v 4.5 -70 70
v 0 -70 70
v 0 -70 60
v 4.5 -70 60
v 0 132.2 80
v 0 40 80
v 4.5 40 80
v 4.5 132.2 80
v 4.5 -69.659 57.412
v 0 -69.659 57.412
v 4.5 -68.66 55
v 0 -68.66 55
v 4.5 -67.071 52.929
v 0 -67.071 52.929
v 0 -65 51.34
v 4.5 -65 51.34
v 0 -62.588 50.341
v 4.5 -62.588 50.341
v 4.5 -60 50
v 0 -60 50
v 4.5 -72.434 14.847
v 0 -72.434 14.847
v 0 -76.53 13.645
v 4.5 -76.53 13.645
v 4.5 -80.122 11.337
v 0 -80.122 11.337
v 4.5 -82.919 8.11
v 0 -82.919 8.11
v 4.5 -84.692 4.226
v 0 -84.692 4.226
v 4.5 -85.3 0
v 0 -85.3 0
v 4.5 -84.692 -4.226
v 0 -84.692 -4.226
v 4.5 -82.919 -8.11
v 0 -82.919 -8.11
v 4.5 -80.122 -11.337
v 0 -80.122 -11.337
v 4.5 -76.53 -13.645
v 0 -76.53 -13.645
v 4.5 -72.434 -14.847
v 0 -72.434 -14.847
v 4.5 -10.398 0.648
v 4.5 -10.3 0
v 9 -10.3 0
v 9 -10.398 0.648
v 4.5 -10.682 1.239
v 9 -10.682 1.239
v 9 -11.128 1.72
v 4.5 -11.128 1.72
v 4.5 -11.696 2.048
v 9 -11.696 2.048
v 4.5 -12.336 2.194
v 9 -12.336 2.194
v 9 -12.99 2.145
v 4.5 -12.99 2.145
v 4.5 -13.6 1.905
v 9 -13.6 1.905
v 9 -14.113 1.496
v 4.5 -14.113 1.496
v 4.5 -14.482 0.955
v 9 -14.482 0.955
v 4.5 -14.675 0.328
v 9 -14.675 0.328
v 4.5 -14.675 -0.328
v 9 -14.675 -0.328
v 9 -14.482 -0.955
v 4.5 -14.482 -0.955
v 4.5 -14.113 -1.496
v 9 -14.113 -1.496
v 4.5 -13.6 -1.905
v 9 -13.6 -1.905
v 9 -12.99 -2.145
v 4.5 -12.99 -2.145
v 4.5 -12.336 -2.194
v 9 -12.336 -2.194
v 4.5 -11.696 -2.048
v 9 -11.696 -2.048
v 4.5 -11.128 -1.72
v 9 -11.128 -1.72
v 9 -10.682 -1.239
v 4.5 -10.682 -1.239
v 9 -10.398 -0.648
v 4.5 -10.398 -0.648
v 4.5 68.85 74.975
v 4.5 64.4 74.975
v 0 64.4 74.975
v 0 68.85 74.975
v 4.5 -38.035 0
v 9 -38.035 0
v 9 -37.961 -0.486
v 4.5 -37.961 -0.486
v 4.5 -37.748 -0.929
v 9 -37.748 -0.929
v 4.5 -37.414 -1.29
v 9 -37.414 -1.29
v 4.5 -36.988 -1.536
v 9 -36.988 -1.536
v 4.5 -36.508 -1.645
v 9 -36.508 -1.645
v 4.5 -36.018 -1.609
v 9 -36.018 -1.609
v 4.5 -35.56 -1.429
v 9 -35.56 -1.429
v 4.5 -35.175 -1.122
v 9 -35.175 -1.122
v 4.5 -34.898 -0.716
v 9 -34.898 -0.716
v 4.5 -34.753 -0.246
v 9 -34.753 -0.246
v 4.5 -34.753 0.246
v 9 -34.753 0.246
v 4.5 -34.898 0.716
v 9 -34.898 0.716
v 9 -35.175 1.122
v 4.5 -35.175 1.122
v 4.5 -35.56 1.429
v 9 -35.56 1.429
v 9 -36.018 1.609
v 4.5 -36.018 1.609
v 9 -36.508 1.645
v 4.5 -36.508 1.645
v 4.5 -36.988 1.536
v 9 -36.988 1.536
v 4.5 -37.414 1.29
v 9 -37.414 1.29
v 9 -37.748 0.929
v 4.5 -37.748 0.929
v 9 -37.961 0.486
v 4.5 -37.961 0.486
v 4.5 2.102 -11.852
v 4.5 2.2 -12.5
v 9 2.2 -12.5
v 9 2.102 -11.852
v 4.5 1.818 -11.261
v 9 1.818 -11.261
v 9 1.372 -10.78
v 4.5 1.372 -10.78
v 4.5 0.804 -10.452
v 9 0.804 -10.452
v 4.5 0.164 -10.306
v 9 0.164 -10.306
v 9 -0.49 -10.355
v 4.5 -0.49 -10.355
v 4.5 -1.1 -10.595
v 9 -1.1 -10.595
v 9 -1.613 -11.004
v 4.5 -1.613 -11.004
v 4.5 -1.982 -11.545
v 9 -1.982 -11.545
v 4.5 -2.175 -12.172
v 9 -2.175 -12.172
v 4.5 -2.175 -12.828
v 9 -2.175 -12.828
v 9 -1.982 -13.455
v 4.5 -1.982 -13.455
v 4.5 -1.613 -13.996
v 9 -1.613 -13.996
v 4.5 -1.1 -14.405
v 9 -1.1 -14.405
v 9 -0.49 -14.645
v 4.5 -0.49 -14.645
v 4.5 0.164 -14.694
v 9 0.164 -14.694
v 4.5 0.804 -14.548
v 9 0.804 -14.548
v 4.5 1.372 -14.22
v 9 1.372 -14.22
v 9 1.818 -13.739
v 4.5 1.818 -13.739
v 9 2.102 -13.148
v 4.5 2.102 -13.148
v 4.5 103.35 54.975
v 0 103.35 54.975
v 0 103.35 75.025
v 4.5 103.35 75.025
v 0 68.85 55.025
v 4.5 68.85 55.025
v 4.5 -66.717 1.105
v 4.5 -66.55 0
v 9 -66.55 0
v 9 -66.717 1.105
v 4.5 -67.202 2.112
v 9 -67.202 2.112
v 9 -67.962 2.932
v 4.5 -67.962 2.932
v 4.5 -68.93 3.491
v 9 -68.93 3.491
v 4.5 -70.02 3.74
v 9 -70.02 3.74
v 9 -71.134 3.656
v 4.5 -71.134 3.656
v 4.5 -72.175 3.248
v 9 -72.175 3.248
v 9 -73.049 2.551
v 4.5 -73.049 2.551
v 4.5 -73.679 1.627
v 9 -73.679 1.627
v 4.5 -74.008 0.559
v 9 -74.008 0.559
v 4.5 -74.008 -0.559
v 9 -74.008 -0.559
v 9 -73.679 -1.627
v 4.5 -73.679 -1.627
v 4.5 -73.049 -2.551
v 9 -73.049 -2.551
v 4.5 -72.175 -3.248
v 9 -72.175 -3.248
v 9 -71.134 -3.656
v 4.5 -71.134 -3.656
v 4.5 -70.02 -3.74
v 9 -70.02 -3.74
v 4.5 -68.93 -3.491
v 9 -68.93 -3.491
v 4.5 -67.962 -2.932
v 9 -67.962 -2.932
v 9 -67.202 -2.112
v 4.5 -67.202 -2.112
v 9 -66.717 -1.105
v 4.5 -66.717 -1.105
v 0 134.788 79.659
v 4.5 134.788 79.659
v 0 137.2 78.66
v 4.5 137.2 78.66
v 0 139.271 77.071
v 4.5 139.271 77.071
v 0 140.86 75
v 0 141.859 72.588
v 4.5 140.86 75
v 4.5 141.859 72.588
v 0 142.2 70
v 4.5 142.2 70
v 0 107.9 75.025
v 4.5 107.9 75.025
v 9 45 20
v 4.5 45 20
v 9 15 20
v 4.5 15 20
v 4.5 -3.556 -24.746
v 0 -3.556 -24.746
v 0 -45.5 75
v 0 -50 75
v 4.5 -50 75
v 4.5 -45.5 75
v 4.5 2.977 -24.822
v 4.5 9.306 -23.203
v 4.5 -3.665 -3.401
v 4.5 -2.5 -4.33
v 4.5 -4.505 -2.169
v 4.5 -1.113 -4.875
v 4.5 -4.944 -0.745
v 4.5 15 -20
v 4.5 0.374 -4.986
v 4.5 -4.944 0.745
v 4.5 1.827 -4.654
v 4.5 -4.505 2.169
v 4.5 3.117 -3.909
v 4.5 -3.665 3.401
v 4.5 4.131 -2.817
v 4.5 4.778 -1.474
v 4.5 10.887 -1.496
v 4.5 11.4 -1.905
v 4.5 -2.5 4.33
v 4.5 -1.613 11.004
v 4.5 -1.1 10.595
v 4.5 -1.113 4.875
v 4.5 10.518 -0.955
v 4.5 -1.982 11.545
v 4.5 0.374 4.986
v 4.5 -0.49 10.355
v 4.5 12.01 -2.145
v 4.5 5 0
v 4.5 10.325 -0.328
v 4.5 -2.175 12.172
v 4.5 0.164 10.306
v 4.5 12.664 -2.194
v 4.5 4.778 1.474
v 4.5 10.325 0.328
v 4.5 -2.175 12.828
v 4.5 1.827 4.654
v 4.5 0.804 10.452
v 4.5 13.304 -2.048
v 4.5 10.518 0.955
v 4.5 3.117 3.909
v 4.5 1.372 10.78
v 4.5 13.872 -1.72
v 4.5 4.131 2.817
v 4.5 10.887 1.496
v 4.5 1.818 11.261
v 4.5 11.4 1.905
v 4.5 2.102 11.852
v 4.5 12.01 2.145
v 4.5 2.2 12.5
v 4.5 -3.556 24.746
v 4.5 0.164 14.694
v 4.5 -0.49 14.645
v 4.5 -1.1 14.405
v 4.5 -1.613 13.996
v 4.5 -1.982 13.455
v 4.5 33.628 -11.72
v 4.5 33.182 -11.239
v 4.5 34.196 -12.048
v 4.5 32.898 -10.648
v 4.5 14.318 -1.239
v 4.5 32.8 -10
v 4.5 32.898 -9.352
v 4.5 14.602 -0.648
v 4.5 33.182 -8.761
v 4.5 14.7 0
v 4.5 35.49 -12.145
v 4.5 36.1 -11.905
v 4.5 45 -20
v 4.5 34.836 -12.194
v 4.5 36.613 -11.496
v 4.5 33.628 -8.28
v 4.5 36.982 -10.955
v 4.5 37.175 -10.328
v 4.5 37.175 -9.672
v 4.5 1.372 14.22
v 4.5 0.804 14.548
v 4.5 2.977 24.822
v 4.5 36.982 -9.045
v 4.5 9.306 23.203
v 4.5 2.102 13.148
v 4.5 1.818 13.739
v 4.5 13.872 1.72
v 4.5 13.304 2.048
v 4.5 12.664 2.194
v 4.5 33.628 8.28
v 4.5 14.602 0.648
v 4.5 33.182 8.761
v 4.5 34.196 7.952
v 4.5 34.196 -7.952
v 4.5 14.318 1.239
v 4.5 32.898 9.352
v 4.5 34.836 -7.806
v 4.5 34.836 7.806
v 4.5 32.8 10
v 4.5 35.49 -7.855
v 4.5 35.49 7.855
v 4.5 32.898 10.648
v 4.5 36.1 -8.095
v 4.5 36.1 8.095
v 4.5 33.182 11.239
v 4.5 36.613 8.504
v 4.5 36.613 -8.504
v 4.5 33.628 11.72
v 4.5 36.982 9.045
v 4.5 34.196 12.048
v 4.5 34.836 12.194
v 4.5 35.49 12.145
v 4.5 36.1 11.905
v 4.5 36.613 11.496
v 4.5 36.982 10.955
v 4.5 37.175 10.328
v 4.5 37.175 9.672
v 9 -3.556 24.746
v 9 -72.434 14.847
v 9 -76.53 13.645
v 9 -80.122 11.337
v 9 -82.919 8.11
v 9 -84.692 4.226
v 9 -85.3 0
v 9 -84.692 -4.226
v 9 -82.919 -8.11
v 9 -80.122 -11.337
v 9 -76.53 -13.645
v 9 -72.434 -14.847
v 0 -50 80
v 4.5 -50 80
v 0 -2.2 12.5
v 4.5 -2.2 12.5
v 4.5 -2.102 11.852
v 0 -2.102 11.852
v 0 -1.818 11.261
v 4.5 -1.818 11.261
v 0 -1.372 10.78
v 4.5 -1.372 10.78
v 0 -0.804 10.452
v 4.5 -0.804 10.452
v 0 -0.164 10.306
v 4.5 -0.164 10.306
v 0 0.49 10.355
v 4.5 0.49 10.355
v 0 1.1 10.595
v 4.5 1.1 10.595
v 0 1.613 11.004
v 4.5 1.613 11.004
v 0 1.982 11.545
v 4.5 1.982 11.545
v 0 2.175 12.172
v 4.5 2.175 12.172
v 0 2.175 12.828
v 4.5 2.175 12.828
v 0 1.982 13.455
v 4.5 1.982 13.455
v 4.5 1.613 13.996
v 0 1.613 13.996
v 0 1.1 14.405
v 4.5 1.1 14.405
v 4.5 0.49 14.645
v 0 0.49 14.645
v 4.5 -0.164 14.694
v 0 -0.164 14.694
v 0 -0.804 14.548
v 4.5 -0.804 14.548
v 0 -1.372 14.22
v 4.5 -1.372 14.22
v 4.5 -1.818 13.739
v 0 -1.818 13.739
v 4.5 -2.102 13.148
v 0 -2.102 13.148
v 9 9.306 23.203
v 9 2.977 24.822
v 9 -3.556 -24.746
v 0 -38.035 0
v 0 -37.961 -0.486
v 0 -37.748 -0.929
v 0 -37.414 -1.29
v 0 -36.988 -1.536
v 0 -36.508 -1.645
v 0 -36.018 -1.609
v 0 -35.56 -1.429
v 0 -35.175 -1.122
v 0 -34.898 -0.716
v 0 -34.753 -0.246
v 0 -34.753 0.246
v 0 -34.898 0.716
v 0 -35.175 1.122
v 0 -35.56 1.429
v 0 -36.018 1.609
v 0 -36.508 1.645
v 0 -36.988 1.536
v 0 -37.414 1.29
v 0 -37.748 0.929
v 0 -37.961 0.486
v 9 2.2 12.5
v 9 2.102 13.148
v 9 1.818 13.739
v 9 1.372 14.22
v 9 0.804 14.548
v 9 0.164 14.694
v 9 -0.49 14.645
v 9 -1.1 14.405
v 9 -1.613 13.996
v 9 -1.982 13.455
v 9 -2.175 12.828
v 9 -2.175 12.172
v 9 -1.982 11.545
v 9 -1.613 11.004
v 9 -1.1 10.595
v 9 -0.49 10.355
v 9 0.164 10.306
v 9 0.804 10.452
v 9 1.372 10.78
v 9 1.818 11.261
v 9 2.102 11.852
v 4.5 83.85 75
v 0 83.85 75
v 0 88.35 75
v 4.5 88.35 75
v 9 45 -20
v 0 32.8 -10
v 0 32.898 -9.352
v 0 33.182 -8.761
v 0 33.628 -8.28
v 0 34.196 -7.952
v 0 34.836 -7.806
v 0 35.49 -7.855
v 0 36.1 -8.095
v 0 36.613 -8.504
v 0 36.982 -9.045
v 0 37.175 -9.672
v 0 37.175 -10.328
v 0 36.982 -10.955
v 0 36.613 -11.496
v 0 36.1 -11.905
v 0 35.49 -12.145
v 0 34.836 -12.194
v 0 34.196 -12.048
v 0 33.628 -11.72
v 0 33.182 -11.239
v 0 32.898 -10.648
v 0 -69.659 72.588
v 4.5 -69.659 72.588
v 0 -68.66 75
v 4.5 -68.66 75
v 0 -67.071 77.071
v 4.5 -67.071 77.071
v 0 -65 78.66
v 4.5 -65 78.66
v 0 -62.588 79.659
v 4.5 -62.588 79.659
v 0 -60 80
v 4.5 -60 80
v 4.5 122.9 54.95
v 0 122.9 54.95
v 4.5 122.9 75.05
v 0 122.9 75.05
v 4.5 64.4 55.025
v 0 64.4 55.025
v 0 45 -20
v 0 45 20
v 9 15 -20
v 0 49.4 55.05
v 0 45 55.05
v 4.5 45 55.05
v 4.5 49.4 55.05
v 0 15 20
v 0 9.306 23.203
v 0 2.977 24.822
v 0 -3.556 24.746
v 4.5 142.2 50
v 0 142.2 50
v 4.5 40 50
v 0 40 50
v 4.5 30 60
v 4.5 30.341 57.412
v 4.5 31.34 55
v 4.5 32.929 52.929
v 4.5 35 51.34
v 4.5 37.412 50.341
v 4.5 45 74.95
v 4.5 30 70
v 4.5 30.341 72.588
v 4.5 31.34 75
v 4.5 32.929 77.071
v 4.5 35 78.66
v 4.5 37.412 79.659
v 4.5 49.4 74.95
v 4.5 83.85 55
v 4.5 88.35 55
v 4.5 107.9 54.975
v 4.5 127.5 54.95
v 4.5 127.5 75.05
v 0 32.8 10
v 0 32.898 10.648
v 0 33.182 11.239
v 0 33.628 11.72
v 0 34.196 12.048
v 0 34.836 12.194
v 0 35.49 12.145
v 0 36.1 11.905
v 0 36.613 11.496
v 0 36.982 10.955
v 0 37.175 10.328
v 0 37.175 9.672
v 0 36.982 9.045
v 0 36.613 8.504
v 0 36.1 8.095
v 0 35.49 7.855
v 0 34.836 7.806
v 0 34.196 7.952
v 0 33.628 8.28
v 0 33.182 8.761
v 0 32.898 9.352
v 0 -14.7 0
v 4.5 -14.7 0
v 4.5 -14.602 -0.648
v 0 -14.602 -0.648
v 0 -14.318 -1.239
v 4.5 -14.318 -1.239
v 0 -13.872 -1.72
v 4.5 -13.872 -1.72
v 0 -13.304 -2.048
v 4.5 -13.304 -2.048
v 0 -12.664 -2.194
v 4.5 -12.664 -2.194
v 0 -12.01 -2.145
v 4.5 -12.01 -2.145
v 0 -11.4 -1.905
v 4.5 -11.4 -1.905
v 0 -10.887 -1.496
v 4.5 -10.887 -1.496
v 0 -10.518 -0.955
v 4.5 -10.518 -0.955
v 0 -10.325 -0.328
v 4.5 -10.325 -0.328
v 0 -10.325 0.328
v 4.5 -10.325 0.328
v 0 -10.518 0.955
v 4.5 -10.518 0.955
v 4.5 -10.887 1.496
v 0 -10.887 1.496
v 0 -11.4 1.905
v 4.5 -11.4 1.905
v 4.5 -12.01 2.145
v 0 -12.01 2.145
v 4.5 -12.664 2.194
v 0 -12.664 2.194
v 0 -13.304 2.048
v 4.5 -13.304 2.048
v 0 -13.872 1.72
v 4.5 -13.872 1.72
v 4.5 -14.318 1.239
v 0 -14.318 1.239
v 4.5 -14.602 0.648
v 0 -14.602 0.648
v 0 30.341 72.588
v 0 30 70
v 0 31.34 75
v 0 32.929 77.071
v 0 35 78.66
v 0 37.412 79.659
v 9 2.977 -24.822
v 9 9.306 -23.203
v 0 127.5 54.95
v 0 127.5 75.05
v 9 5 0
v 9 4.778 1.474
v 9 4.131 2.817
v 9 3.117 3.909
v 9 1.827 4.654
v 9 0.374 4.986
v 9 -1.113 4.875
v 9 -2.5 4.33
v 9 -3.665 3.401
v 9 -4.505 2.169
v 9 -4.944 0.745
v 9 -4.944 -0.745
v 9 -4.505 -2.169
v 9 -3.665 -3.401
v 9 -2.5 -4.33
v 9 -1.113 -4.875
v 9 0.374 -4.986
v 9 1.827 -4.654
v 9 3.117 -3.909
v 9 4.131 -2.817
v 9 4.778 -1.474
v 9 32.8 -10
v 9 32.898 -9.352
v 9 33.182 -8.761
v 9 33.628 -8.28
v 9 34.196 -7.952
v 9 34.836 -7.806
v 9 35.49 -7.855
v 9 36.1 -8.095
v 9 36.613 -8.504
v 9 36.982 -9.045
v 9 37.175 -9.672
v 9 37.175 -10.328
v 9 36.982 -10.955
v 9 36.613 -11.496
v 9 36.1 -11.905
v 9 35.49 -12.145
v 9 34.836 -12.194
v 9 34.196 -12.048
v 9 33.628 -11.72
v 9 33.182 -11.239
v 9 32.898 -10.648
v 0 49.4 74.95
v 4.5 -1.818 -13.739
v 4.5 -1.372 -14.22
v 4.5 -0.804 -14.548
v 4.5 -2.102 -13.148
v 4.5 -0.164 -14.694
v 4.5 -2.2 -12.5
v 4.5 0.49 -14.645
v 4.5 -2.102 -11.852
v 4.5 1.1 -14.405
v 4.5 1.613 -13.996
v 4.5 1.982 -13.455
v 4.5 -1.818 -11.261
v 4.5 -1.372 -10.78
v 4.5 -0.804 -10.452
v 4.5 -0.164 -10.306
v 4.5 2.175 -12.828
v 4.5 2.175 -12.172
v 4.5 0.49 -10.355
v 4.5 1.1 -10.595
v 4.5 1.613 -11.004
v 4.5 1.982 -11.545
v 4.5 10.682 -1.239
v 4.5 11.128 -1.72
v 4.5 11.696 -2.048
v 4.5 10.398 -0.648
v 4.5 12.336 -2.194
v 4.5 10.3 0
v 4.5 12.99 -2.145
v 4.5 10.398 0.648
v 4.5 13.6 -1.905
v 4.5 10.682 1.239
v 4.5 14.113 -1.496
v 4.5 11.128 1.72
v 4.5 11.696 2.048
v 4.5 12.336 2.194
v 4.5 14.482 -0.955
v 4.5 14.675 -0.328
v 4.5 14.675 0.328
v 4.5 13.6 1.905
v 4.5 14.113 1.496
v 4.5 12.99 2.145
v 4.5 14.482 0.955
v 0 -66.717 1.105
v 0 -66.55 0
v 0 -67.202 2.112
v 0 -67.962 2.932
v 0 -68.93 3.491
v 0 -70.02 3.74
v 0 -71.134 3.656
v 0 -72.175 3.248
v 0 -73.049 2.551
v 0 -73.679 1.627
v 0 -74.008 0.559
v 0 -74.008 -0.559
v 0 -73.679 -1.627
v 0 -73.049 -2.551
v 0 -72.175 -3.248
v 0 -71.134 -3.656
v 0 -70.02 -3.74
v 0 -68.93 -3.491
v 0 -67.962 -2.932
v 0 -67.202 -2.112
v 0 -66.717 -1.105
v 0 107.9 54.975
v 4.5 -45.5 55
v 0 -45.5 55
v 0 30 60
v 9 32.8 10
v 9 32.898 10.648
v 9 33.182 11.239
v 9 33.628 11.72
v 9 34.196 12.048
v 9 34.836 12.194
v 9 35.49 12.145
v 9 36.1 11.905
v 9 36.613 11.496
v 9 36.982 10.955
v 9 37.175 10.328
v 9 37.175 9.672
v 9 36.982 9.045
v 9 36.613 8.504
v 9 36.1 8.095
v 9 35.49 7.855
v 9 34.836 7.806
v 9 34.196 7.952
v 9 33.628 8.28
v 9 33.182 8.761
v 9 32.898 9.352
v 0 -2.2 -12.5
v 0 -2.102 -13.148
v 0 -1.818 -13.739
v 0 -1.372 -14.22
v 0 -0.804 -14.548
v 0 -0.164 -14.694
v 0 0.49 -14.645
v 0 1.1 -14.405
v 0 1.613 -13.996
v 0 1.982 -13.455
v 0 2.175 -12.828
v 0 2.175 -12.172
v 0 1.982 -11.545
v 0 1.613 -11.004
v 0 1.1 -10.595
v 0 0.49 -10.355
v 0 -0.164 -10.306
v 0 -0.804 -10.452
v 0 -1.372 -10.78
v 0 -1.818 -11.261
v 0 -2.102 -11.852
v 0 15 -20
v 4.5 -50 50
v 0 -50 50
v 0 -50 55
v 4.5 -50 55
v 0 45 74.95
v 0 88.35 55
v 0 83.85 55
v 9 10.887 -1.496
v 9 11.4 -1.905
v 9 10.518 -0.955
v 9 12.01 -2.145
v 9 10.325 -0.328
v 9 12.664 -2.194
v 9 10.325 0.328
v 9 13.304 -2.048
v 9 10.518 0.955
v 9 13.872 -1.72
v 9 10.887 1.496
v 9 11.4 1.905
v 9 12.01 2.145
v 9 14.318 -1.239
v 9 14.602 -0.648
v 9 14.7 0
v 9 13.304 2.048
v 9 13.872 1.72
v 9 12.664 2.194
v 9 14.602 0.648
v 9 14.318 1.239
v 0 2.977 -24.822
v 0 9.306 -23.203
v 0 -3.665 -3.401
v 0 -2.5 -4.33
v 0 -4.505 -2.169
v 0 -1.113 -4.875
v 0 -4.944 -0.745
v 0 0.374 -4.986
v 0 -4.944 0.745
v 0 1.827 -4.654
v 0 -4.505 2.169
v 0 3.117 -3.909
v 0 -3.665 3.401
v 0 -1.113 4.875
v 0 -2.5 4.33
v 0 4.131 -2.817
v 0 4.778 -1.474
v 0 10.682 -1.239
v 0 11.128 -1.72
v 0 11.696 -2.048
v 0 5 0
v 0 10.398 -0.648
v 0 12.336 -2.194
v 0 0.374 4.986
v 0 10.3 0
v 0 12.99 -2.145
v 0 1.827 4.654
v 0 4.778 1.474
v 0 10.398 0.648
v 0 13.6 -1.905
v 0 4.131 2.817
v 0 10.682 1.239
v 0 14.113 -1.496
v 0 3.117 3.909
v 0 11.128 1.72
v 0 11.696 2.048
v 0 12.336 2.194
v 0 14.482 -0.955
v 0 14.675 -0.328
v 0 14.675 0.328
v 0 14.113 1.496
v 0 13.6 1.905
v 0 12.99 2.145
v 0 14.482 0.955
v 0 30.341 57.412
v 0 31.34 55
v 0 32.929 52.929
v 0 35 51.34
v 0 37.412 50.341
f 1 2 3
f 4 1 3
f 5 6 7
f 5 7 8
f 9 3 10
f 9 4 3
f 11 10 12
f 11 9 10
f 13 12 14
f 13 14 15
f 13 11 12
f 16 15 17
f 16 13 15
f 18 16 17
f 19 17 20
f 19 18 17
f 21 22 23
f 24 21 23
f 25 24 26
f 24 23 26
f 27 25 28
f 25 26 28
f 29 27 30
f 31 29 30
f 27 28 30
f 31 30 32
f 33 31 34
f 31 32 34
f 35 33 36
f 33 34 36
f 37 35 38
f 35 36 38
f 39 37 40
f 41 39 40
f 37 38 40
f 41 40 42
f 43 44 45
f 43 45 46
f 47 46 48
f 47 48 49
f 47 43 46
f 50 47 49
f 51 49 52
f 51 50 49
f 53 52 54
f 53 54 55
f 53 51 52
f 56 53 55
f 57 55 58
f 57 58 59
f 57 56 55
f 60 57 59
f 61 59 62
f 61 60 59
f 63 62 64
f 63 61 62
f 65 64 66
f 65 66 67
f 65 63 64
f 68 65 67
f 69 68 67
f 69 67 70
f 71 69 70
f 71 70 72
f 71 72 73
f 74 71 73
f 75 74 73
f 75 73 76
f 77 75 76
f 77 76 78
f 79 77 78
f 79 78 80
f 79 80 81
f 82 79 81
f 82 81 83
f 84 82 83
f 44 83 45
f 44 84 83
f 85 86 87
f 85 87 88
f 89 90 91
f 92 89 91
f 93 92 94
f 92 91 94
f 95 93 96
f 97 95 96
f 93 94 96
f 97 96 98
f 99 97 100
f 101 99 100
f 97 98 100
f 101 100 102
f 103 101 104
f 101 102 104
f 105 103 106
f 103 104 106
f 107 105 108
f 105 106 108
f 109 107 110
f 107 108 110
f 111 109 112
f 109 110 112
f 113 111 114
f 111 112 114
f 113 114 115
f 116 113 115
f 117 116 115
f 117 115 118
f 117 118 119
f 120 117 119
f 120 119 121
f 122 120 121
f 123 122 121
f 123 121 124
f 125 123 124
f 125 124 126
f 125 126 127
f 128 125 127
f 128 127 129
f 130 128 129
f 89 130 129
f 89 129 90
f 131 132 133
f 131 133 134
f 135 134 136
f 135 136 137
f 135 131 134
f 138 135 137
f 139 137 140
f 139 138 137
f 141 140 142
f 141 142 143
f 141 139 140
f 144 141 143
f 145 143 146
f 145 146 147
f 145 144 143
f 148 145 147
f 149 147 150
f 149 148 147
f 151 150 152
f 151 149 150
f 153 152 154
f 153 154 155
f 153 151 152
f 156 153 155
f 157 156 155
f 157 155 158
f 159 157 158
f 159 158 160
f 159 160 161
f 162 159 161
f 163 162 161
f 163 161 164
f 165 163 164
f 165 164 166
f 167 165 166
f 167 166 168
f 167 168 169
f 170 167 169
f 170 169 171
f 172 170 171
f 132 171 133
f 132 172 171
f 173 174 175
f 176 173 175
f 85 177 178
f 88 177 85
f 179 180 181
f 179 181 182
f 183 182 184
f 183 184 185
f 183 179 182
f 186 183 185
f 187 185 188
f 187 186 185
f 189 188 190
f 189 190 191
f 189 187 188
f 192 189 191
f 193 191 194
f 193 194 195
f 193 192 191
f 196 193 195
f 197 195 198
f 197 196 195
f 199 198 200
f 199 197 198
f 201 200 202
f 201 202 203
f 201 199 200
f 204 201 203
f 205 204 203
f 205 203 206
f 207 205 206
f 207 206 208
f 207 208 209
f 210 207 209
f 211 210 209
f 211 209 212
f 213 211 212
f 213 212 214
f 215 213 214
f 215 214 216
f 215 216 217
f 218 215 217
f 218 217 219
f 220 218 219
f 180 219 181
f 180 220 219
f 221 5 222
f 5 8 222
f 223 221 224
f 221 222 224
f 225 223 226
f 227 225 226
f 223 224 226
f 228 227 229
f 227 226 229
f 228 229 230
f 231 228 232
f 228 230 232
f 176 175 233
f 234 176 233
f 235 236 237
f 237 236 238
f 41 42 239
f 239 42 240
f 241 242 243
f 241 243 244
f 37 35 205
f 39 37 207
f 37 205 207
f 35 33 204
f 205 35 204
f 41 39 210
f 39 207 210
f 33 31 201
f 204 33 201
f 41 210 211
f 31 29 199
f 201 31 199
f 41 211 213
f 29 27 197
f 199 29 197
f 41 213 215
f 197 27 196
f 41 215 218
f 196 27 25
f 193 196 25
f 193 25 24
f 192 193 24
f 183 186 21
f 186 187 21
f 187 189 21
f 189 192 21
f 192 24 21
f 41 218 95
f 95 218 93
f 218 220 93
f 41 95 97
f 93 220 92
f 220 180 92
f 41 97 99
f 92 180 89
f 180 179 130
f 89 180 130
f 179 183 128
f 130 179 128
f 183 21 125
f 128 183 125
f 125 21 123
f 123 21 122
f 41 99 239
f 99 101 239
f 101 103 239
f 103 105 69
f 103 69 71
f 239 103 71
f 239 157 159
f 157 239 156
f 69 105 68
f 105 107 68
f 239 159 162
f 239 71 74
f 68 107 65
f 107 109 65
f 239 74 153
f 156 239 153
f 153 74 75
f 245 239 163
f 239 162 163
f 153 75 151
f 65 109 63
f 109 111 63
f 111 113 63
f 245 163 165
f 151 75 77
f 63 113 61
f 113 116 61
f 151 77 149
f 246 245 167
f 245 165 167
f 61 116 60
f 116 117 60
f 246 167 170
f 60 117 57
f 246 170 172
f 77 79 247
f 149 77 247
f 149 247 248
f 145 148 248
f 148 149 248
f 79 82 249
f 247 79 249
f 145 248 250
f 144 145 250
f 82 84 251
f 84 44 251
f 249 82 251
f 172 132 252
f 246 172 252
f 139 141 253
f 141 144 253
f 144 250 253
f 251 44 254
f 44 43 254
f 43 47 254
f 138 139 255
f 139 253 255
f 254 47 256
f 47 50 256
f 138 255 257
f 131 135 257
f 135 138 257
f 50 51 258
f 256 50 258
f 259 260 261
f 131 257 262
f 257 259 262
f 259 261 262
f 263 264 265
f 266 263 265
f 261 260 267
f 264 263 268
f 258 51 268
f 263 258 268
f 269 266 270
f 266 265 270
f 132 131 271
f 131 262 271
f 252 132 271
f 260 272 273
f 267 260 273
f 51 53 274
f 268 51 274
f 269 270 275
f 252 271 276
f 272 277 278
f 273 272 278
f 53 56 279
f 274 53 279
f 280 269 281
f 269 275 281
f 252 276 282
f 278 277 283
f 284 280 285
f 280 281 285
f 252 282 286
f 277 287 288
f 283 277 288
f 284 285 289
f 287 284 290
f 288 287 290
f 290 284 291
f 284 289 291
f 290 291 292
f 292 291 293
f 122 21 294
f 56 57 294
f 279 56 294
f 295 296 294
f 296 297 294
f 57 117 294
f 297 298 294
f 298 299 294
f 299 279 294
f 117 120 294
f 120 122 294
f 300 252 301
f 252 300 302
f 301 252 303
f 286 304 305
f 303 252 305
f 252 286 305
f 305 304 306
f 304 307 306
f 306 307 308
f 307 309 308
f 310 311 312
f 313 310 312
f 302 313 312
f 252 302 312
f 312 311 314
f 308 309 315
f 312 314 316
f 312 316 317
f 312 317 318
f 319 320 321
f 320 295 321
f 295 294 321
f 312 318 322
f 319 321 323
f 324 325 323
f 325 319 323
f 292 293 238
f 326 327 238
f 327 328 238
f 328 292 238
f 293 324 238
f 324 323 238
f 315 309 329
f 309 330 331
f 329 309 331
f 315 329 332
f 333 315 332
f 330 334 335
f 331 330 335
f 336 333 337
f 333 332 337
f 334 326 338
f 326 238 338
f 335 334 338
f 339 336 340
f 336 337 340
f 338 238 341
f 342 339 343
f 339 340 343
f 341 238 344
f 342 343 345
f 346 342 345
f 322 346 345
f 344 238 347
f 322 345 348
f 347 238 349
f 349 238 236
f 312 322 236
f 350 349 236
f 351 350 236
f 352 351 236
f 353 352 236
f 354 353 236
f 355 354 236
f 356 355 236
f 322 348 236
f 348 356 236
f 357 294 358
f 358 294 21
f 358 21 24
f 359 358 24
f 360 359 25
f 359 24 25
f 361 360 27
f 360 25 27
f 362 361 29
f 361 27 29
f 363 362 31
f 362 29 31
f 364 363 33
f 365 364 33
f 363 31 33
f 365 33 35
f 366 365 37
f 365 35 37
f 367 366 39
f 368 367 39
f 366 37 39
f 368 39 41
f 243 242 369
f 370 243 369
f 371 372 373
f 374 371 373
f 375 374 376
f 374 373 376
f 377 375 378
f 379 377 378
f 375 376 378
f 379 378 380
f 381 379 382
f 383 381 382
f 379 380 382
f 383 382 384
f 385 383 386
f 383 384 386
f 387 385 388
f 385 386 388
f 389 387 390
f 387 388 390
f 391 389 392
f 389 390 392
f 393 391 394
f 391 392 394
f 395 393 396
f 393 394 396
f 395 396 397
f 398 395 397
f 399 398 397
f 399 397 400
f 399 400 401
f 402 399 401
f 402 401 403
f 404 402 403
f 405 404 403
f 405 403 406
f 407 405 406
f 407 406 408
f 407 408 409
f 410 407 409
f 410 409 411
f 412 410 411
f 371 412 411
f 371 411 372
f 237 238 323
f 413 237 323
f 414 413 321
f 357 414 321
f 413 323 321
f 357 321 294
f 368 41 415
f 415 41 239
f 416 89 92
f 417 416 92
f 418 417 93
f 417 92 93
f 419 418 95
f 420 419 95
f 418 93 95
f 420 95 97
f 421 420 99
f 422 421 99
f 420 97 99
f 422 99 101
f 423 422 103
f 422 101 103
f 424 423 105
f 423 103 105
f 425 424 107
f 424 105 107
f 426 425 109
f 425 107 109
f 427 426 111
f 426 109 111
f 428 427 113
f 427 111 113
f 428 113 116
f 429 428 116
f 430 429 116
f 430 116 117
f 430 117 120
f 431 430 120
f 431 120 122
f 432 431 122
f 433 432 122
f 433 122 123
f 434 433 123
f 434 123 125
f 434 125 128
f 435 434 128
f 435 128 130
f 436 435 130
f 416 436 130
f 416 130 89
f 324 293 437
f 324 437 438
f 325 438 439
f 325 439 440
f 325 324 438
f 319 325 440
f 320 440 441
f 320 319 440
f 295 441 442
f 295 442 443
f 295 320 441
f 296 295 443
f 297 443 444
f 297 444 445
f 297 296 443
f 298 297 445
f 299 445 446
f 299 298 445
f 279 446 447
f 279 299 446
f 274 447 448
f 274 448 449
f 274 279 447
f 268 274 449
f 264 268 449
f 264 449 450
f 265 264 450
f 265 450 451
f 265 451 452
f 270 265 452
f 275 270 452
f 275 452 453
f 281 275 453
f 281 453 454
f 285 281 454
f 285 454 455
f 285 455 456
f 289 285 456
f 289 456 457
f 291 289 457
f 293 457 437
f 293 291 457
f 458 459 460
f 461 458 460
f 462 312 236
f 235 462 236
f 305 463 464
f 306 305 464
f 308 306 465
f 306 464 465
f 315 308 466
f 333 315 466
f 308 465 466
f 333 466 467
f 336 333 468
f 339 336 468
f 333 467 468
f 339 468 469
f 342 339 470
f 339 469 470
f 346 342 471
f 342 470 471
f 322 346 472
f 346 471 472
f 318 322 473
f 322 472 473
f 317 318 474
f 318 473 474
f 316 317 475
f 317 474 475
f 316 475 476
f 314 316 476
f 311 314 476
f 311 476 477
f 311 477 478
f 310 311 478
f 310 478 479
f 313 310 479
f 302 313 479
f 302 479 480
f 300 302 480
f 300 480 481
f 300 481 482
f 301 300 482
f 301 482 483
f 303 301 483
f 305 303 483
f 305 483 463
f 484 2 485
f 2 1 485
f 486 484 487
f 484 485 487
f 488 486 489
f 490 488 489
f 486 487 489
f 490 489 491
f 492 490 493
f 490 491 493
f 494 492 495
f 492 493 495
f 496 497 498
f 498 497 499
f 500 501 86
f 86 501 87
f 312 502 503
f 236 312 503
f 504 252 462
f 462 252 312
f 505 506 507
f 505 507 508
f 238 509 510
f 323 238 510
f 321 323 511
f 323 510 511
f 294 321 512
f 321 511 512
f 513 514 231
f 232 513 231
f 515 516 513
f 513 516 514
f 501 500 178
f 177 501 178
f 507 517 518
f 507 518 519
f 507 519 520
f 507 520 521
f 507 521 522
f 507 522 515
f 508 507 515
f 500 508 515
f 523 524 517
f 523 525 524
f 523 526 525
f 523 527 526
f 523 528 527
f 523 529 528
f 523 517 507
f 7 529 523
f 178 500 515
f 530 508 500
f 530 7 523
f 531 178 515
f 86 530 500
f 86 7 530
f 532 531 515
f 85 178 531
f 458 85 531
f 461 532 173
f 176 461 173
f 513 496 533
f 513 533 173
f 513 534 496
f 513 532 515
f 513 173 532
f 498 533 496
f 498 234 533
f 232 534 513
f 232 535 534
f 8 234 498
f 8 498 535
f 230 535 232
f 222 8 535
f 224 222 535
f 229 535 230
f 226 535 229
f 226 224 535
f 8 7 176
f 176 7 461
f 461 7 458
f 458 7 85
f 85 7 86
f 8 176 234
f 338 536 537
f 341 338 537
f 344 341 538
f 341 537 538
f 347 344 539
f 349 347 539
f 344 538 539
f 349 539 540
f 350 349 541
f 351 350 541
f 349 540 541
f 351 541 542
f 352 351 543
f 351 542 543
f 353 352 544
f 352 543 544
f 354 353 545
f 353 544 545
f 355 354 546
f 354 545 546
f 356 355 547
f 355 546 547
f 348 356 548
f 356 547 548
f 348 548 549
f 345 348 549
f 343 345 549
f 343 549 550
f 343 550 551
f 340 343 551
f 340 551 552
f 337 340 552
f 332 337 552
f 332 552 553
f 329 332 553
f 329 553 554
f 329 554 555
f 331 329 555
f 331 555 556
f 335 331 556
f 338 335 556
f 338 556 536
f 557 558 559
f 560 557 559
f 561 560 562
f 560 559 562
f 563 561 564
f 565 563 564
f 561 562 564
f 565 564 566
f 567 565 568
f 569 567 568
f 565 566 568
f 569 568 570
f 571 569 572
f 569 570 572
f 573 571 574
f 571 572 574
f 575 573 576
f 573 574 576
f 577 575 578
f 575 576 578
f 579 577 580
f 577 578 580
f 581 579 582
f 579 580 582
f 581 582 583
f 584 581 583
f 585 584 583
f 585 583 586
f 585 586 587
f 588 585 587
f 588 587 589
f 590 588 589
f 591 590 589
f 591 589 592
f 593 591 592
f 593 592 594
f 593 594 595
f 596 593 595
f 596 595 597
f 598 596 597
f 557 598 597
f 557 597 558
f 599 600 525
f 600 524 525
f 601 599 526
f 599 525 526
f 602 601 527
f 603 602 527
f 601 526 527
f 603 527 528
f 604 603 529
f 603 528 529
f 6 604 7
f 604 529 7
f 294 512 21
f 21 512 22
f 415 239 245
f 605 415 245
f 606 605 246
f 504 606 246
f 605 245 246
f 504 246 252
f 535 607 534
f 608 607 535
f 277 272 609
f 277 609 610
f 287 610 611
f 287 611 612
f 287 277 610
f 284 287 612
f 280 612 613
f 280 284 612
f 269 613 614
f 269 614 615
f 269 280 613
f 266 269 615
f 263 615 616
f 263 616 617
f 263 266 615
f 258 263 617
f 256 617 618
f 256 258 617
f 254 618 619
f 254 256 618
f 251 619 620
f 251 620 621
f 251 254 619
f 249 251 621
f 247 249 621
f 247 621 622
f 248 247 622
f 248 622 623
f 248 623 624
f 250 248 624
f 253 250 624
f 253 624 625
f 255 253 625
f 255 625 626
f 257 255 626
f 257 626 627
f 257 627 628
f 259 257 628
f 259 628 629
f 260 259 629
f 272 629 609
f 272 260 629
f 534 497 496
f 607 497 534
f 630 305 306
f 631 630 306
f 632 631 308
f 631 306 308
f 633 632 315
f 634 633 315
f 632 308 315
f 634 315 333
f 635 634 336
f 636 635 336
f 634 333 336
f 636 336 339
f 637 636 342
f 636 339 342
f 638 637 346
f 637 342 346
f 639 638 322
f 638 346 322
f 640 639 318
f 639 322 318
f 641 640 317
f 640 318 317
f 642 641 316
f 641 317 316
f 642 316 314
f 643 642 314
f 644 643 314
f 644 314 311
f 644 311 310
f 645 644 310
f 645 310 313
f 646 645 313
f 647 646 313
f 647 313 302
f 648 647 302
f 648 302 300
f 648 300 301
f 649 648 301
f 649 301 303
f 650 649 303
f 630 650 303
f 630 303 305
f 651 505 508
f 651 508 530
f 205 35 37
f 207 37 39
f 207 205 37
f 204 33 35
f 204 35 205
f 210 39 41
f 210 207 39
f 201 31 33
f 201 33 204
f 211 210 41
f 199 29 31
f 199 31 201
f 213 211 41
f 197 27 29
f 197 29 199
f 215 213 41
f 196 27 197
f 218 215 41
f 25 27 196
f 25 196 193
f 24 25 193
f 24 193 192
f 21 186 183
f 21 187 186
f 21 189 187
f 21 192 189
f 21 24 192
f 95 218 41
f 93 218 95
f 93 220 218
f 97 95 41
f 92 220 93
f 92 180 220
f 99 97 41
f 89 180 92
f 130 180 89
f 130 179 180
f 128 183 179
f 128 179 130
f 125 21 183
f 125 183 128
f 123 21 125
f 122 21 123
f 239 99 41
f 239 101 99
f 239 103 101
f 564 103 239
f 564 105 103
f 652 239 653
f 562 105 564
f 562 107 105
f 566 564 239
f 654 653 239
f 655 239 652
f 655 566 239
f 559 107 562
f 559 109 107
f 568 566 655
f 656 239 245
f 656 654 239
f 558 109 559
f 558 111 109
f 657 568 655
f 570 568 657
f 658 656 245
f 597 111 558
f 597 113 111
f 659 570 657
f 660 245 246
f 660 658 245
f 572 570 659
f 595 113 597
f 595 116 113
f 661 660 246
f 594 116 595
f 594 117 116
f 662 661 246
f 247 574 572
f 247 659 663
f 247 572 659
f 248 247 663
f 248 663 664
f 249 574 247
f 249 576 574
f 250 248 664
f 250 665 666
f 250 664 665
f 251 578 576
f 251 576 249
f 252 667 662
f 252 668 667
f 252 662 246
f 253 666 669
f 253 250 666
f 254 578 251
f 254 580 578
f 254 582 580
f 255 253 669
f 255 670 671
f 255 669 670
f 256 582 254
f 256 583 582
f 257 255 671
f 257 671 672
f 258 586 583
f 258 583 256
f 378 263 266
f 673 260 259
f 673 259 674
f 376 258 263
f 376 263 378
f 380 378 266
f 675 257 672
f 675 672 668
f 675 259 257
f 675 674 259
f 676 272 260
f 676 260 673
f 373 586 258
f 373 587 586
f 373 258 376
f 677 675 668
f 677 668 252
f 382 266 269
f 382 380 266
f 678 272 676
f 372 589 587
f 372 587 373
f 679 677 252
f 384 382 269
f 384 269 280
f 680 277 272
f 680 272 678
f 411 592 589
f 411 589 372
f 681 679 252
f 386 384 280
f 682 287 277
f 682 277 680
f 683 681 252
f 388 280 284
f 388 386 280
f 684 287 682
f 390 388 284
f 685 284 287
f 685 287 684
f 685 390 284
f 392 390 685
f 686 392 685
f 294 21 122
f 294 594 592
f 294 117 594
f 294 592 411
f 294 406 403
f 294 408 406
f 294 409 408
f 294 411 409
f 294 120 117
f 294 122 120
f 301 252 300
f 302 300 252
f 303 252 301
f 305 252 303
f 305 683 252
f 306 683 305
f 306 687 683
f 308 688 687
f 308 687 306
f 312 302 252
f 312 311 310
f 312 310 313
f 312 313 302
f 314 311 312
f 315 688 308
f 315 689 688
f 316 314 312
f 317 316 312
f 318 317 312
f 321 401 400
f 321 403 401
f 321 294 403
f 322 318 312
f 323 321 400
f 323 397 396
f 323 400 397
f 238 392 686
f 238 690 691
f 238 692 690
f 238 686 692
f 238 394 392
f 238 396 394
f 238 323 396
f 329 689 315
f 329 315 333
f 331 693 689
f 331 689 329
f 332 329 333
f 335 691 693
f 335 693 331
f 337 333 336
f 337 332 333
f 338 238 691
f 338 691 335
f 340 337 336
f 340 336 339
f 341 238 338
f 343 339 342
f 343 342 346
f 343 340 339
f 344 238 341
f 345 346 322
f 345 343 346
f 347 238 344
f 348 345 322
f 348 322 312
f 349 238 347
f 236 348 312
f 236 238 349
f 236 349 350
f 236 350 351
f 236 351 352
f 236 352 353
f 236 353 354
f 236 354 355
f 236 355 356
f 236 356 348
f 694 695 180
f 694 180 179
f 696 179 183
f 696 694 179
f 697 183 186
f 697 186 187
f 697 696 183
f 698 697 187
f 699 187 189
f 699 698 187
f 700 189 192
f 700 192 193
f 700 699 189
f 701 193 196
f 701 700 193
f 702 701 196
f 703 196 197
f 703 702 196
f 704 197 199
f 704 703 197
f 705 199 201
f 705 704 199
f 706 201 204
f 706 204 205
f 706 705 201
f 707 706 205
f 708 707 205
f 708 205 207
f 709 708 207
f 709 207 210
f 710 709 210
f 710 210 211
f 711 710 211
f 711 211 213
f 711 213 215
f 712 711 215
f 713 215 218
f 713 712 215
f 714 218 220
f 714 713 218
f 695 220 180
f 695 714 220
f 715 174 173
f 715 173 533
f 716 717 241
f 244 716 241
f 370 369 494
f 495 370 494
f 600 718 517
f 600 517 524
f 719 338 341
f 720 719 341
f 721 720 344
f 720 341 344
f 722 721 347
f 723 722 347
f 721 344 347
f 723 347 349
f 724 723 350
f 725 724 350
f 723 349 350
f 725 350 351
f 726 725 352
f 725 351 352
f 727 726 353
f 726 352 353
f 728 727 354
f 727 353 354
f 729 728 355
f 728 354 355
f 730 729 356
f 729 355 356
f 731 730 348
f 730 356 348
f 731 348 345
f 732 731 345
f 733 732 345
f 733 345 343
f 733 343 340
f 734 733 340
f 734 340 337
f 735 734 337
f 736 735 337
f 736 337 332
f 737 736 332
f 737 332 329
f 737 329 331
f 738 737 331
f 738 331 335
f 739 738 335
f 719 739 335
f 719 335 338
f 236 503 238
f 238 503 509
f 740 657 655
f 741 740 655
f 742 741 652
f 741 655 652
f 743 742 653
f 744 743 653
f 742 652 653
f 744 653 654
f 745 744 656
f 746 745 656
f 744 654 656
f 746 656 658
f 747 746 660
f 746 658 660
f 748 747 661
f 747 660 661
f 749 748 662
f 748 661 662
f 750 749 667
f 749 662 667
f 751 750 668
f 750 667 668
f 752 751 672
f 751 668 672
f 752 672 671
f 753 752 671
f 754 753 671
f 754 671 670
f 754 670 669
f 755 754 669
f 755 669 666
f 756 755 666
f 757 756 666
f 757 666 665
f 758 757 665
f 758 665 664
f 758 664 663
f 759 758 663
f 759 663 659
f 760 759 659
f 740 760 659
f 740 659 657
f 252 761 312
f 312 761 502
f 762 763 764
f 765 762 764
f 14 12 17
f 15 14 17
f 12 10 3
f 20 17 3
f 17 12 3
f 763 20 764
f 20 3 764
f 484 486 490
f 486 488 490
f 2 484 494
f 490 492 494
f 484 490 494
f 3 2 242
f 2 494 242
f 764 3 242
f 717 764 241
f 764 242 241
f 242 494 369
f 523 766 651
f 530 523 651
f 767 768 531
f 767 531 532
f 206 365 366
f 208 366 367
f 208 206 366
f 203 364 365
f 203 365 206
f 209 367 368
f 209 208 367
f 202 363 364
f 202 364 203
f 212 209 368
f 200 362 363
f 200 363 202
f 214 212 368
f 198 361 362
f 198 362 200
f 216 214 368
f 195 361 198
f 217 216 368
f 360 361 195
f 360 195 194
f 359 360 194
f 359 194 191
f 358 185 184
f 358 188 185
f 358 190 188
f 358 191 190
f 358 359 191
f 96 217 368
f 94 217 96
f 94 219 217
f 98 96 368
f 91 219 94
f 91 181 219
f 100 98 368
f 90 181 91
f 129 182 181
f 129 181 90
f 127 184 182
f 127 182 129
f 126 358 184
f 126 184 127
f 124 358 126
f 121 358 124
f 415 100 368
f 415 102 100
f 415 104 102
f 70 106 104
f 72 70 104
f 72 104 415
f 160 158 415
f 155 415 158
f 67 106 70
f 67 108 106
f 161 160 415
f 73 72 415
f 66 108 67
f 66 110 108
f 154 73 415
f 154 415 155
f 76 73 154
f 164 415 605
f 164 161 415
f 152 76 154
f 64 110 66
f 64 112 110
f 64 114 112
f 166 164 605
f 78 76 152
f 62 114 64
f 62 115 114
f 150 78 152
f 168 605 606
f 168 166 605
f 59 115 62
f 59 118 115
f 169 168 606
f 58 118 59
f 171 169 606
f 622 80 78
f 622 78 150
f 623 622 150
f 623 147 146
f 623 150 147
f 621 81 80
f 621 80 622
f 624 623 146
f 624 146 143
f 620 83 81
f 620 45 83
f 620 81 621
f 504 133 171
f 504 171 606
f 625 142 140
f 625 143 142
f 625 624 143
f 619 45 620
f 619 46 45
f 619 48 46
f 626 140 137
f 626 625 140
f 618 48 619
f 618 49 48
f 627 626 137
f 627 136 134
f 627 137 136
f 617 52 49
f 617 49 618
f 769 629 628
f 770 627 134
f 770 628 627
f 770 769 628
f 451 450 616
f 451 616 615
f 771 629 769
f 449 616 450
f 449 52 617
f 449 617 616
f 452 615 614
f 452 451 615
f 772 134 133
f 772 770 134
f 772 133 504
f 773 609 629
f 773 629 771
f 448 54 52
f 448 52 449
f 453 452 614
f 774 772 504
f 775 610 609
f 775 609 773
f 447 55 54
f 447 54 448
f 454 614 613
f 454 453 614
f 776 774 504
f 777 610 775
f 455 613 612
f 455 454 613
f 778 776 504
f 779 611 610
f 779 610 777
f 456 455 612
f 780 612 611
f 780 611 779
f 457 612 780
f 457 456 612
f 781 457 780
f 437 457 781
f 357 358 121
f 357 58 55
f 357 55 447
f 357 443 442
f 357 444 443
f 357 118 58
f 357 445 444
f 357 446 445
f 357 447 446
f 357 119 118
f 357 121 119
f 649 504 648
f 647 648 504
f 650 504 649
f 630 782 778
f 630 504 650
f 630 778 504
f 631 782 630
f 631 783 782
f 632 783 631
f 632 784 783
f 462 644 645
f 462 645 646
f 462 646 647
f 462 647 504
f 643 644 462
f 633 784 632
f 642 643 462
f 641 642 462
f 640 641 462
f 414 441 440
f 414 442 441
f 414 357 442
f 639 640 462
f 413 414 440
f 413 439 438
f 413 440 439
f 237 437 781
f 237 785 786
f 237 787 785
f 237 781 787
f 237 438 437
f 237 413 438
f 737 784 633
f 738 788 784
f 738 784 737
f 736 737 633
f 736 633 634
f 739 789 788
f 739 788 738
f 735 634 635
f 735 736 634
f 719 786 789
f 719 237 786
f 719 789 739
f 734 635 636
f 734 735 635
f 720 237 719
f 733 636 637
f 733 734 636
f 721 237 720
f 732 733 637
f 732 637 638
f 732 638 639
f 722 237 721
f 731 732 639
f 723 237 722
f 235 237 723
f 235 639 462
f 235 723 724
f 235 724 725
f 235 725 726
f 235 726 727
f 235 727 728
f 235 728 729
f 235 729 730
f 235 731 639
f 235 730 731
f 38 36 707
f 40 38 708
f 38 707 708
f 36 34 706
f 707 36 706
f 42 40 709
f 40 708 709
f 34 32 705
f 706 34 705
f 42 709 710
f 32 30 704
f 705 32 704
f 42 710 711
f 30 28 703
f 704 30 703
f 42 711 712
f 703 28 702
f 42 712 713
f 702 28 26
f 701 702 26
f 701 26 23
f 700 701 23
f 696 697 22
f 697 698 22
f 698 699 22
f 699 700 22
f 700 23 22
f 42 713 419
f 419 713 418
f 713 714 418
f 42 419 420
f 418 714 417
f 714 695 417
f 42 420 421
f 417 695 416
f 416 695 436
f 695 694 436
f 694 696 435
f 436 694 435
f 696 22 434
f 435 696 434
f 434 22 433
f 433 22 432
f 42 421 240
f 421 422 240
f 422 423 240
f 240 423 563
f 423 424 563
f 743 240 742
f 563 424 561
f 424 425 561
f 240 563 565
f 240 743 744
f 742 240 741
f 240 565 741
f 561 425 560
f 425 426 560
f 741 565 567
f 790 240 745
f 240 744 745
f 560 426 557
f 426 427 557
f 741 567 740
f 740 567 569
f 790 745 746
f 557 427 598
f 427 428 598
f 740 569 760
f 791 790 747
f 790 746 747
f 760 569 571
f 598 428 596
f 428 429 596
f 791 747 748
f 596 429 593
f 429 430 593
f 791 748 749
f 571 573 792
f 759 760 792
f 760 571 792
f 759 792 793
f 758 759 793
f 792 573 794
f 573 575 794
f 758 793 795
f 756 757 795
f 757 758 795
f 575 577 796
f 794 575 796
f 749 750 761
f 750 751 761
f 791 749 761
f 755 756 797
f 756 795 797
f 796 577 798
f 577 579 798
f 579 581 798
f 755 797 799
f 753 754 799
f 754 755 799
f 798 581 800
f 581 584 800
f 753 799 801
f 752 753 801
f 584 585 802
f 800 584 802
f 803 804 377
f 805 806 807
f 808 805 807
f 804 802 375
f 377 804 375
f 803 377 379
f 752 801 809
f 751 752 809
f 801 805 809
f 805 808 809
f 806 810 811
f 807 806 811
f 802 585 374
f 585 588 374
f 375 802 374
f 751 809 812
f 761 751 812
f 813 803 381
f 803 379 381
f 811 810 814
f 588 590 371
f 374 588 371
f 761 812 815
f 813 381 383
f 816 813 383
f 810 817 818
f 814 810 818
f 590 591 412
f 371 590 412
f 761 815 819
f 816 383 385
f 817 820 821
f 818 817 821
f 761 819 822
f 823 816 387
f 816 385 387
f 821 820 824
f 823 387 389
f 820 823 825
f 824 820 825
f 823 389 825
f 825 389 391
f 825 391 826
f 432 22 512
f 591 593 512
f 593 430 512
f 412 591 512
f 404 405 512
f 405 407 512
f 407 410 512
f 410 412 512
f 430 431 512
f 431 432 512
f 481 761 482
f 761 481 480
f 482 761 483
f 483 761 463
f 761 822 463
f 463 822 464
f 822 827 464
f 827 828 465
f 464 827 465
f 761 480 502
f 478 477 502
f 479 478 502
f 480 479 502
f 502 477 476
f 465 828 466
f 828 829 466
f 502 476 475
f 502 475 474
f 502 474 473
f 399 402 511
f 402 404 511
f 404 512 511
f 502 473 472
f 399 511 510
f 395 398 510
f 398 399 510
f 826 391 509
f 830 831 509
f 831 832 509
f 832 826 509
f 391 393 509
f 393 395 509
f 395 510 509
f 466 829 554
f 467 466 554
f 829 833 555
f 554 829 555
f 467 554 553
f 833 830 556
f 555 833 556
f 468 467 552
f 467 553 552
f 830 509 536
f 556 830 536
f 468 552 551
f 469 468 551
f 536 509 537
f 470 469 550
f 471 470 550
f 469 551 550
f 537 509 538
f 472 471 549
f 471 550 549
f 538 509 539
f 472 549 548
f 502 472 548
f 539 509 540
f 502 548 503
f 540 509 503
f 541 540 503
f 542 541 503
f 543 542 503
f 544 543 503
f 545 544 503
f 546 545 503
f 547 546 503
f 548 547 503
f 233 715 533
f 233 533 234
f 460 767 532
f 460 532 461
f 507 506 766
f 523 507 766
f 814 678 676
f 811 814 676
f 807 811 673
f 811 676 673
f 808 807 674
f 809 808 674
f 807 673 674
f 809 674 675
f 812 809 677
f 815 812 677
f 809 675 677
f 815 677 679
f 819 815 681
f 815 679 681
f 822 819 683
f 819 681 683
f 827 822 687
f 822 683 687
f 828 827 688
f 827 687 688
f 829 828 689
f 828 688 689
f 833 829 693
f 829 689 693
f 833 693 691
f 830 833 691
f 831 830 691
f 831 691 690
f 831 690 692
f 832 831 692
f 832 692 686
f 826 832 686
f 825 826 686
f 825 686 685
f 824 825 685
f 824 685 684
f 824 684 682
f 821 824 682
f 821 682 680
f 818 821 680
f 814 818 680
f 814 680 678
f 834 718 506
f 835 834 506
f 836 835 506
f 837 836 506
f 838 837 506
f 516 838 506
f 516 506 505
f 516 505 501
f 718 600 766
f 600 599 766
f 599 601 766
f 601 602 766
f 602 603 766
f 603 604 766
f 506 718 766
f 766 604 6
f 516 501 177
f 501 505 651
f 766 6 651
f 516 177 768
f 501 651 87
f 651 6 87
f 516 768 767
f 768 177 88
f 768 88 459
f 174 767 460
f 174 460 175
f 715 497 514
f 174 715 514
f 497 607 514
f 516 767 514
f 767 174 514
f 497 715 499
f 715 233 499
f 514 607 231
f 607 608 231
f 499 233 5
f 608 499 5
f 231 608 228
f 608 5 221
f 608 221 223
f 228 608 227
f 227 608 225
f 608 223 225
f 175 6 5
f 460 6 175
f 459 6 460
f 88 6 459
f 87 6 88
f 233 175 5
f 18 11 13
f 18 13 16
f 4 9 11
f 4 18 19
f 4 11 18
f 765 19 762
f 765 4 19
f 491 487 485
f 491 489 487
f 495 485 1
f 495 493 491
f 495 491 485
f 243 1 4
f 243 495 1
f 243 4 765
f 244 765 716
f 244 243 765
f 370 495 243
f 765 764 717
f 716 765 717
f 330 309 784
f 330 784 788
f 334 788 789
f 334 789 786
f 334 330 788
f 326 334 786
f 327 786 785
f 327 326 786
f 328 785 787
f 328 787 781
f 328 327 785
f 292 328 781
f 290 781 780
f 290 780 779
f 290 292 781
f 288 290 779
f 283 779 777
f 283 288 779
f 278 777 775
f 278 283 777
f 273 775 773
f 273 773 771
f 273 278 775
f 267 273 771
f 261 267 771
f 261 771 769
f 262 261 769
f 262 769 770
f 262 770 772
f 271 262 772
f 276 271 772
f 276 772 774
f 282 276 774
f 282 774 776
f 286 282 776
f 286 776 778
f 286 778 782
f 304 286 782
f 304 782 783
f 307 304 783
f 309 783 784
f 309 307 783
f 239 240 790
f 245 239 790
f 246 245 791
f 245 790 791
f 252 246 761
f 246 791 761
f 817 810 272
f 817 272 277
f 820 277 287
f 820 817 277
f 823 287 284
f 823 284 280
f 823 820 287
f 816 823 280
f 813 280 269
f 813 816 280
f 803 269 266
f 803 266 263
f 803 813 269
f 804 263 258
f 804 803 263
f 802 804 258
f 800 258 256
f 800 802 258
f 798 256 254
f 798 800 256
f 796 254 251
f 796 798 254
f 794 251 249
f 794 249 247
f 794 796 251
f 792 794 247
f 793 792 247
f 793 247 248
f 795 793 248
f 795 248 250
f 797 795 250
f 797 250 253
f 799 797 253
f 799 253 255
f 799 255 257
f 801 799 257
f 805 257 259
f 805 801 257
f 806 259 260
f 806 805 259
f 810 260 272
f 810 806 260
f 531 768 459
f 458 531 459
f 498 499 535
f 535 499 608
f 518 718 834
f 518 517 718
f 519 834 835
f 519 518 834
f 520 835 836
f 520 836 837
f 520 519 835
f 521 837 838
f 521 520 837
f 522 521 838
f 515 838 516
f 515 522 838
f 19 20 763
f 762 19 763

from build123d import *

# Parameters (mm, degrees)
F0_R        = 3.75
F0_R_2      = 5
F1_DEPTH    = 4.5
F2_D        = 4.4
F2_DEPTH    = 20
F2_TIP      = 1.3218933619
F3_W        = 4.5
F3_H        = 20
F4_DEPTH    = 4.5
F3_W_2      = 112.2
F3_H_2      = 30
F3_W_3      = 4.45
F3_H_3      = 19.95
F3_W_4      = 4.4
F3_H_4      = 19.9
F3_W_5      = 4.55
F3_H_5      = 20.05
F3_W_6      = 4.6
F3_H_6      = 20.1
F5_R        = 10
F5_2_R      = 10
F6_R        = 2.2
F6_R_2      = 3.75
F6_R_3      = 5
F7_DEPTH    = 4.5
F8_D        = 3.3
F8_DEPTH    = 20
F8_TIP      = 0.9914200214
F8_2_D      = 3.3
F8_2_DEPTH  = 20
F8_2_TIP    = 0.9914200214
F10_D       = 4.4
F10_DEPTH   = 20
F10_TIP     = 1.3218933619
F10_2_D     = 4.4
F10_2_DEPTH = 20
F10_2_TIP   = 1.3218933619


with BuildPart() as f1:
    # F0 (on Right) → F1 (new body)
    with BuildSketch(Plane.YZ):
        with BuildLine():
            ThreePointArc((-72.43371266, -14.8474667969), (-60.476703453, -11.3359095334), (-55.3, 0))
            ThreePointArc((-55.3, 0), (-60.476703453, 11.3359095334), (-72.43371266, 14.8474667969))
            ThreePointArc((-72.43371266, 14.8474667969), (-85.3, 0), (-72.43371266, -14.8474667969))
        make_face()
        with Locations((-70.3, 0)):
            Circle(F0_R, mode=Mode.SUBTRACT)
        with BuildLine():
            ThreePointArc((-72.43371266, 14.8474667969), (-60.476703453, 11.3359095334), (-55.3, 0))
            ThreePointArc((-55.3, 0), (-60.476703453, -11.3359095334), (-72.43371266, -14.8474667969))
            Line((-72.43371266, -14.8474667969), (-3.5561877667, -24.7457779948))
            ThreePointArc((-3.5561877667, -24.7457779948), (-25, 0), (-3.5561877667, 24.7457779948))
            Line((-3.5561877667, 24.7457779948), (-72.43371266, 14.8474667969))
        make_face()
        with BuildLine():
            ThreePointArc((15, 20), (6.1944177936, 24.2204291498), (-3.5561877667, 24.7457779948))
            ThreePointArc((-3.5561877667, 24.7457779948), (-25, 0), (-3.5561877667, -24.7457779948))
            ThreePointArc((-3.5561877667, -24.7457779948), (6.1944177936, -24.2204291498), (15, -20))
            ThreePointArc((15, -20), (22.360679775, -11.1803398875), (25, 0))
            ThreePointArc((25, 0), (22.360679775, 11.1803398875), (15, 20))
        make_face()
        Circle(F0_R_2, mode=Mode.SUBTRACT)
        with BuildLine():
            Line((45, 20), (15, 20))
            ThreePointArc((15, 20), (22.360679775, 11.1803398875), (25, 0))
            ThreePointArc((25, 0), (22.360679775, -11.1803398875), (15, -20))
            Line((15, -20), (45, -20))
            Line((45, -20), (45, 20))
        make_face()
    extrude(amount=F1_DEPTH)

    # F2
    with Locations(Plane(origin=(0, 0, 0), x_dir=(0, 1, 0), z_dir=(-1, 0, 0))):
        with Locations((-12.5, 0), (0, -12.5), (0, 12.5), (12.5, 0)):
            Hole(F2_D / 2, depth=F2_DEPTH)
            with Locations((0, 0, -(F2_DEPTH + F2_TIP / 2))):  # 118° drill point
                Cone(0, F2_D / 2, F2_TIP, mode=Mode.SUBTRACT)

    # F8
    with Locations(Plane(origin=(0, 0, 0), x_dir=(0, 1, 0), z_dir=(-1, 0, 0))):
        with Locations((-36.3848023117, 0)):
            Hole(F8_D / 2, depth=F8_DEPTH)
            with Locations((0, 0, -(F8_DEPTH + F8_TIP / 2))):  # 118° drill point
                Cone(0, F8_D / 2, F8_TIP, mode=Mode.SUBTRACT)

    # F10
    with Locations(Plane.YZ.offset(9)):
        with Locations((35, -10), (35, 10)):
            Hole(F10_D / 2, depth=F10_DEPTH)
            with Locations((0, 0, -(F10_DEPTH + F10_TIP / 2))):  # 118° drill point
                Cone(0, F10_D / 2, F10_TIP, mode=Mode.SUBTRACT)


with BuildPart() as f4:
    # F3 (on Right) → F4 (new body)
    with BuildSketch(Plane.YZ):
        Polygon((-70, 80), (-70, 50), (-50, 50), (-50, 55), (-50, 75), (-50, 80), align=None)
        with Locations((-47.75, 65)):
            Rectangle(F3_W, F3_H)
    extrude(amount=F4_DEPTH)

    # F5
    f5_edges = [f4.edges().sort_by_distance(p)[0] for p in [
        (2.25, -70, 50),
        (2.25, -70, 80),
    ]]
    fillet(f5_edges, radius=F5_R)


with BuildPart() as f4b:
    # F3 (on Right) → F4, piece 2 (new body)
    with BuildSketch(Plane.YZ):
        with Locations((86.1, 65)):
            Rectangle(F3_W_2, F3_H_2)
        with Locations((66.625, 65)):
            Rectangle(F3_W_3, F3_H_3, mode=Mode.SUBTRACT)
        with Locations((47.2, 65)):
            Rectangle(F3_W_4, F3_H_4, mode=Mode.SUBTRACT)
        with Locations((86.1, 65)):
            Rectangle(F3_W, F3_H, mode=Mode.SUBTRACT)
        with Locations((105.625, 65)):
            Rectangle(F3_W_5, F3_H_5, mode=Mode.SUBTRACT)
        with Locations((125.2, 65)):
            Rectangle(F3_W_6, F3_H_6, mode=Mode.SUBTRACT)
    extrude(amount=F4_DEPTH)

    # F5#2
    f5_2_edges = [f4b.edges().sort_by_distance(p)[0] for p in [
        (2.25, 30, 80),
        (2.25, 30, 50),
        (2.25, 142.2, 80),
    ]]
    fillet(f5_2_edges, radius=F5_2_R)


with BuildPart() as f7:
    # F6 (on face) → F7 (new body)
    with BuildSketch(Plane.YZ.offset(4.5)):
        with BuildLine():
            Line((45, 20), (15, 20))
            ThreePointArc((15, 20), (6.1944177936, 24.2204291498), (-3.5561877667, 24.7457779948))
            Line((-3.5561877667, 24.7457779948), (-72.43371266, 14.8474667969))
            ThreePointArc((-72.43371266, 14.8474667969), (-85.3, 0), (-72.43371266, -14.8474667969))
            Line((-72.43371266, -14.8474667969), (-3.5561877667, -24.7457779948))
            ThreePointArc((-3.5561877667, -24.7457779948), (6.1944177936, -24.2204291498), (15, -20))
            Line((15, -20), (45, -20))
            Line((45, -20), (45, 20))
        make_face()
        with Locations((0, -12.5)):
            Circle(F6_R, mode=Mode.SUBTRACT)
        with Locations((-70.3, 0)):
            Circle(F6_R_2, mode=Mode.SUBTRACT)
        with Locations((-12.5, 0)):
            Circle(F6_R, mode=Mode.SUBTRACT)
        Circle(F6_R_3, mode=Mode.SUBTRACT)
        with Locations((12.5, 0)):
            Circle(F6_R, mode=Mode.SUBTRACT)
        with Locations((0, 12.5)):
            Circle(F6_R, mode=Mode.SUBTRACT)
    extrude(amount=F7_DEPTH)

    # F8#2
    with Locations(Plane(origin=(0, 0, 0), x_dir=(0, 1, 0), z_dir=(-1, 0, 0))):
        with Locations((-36.3848023117, 0)):
            Hole(F8_2_D / 2, depth=F8_2_DEPTH)
            with Locations((0, 0, -(F8_2_DEPTH + F8_2_TIP / 2))):  # 118° drill point
                Cone(0, F8_2_D / 2, F8_2_TIP, mode=Mode.SUBTRACT)

    # F10#2
    with Locations(Plane.YZ.offset(9)):
        with Locations((35, -10), (35, 10)):
            Hole(F10_2_D / 2, depth=F10_2_DEPTH)
            with Locations((0, 0, -(F10_2_DEPTH + F10_2_TIP / 2))):  # 118° drill point
                Cone(0, F10_2_D / 2, F10_2_TIP, mode=Mode.SUBTRACT)


solid = Compound([f1.part, f4.part, f4b.part, f7.part])
